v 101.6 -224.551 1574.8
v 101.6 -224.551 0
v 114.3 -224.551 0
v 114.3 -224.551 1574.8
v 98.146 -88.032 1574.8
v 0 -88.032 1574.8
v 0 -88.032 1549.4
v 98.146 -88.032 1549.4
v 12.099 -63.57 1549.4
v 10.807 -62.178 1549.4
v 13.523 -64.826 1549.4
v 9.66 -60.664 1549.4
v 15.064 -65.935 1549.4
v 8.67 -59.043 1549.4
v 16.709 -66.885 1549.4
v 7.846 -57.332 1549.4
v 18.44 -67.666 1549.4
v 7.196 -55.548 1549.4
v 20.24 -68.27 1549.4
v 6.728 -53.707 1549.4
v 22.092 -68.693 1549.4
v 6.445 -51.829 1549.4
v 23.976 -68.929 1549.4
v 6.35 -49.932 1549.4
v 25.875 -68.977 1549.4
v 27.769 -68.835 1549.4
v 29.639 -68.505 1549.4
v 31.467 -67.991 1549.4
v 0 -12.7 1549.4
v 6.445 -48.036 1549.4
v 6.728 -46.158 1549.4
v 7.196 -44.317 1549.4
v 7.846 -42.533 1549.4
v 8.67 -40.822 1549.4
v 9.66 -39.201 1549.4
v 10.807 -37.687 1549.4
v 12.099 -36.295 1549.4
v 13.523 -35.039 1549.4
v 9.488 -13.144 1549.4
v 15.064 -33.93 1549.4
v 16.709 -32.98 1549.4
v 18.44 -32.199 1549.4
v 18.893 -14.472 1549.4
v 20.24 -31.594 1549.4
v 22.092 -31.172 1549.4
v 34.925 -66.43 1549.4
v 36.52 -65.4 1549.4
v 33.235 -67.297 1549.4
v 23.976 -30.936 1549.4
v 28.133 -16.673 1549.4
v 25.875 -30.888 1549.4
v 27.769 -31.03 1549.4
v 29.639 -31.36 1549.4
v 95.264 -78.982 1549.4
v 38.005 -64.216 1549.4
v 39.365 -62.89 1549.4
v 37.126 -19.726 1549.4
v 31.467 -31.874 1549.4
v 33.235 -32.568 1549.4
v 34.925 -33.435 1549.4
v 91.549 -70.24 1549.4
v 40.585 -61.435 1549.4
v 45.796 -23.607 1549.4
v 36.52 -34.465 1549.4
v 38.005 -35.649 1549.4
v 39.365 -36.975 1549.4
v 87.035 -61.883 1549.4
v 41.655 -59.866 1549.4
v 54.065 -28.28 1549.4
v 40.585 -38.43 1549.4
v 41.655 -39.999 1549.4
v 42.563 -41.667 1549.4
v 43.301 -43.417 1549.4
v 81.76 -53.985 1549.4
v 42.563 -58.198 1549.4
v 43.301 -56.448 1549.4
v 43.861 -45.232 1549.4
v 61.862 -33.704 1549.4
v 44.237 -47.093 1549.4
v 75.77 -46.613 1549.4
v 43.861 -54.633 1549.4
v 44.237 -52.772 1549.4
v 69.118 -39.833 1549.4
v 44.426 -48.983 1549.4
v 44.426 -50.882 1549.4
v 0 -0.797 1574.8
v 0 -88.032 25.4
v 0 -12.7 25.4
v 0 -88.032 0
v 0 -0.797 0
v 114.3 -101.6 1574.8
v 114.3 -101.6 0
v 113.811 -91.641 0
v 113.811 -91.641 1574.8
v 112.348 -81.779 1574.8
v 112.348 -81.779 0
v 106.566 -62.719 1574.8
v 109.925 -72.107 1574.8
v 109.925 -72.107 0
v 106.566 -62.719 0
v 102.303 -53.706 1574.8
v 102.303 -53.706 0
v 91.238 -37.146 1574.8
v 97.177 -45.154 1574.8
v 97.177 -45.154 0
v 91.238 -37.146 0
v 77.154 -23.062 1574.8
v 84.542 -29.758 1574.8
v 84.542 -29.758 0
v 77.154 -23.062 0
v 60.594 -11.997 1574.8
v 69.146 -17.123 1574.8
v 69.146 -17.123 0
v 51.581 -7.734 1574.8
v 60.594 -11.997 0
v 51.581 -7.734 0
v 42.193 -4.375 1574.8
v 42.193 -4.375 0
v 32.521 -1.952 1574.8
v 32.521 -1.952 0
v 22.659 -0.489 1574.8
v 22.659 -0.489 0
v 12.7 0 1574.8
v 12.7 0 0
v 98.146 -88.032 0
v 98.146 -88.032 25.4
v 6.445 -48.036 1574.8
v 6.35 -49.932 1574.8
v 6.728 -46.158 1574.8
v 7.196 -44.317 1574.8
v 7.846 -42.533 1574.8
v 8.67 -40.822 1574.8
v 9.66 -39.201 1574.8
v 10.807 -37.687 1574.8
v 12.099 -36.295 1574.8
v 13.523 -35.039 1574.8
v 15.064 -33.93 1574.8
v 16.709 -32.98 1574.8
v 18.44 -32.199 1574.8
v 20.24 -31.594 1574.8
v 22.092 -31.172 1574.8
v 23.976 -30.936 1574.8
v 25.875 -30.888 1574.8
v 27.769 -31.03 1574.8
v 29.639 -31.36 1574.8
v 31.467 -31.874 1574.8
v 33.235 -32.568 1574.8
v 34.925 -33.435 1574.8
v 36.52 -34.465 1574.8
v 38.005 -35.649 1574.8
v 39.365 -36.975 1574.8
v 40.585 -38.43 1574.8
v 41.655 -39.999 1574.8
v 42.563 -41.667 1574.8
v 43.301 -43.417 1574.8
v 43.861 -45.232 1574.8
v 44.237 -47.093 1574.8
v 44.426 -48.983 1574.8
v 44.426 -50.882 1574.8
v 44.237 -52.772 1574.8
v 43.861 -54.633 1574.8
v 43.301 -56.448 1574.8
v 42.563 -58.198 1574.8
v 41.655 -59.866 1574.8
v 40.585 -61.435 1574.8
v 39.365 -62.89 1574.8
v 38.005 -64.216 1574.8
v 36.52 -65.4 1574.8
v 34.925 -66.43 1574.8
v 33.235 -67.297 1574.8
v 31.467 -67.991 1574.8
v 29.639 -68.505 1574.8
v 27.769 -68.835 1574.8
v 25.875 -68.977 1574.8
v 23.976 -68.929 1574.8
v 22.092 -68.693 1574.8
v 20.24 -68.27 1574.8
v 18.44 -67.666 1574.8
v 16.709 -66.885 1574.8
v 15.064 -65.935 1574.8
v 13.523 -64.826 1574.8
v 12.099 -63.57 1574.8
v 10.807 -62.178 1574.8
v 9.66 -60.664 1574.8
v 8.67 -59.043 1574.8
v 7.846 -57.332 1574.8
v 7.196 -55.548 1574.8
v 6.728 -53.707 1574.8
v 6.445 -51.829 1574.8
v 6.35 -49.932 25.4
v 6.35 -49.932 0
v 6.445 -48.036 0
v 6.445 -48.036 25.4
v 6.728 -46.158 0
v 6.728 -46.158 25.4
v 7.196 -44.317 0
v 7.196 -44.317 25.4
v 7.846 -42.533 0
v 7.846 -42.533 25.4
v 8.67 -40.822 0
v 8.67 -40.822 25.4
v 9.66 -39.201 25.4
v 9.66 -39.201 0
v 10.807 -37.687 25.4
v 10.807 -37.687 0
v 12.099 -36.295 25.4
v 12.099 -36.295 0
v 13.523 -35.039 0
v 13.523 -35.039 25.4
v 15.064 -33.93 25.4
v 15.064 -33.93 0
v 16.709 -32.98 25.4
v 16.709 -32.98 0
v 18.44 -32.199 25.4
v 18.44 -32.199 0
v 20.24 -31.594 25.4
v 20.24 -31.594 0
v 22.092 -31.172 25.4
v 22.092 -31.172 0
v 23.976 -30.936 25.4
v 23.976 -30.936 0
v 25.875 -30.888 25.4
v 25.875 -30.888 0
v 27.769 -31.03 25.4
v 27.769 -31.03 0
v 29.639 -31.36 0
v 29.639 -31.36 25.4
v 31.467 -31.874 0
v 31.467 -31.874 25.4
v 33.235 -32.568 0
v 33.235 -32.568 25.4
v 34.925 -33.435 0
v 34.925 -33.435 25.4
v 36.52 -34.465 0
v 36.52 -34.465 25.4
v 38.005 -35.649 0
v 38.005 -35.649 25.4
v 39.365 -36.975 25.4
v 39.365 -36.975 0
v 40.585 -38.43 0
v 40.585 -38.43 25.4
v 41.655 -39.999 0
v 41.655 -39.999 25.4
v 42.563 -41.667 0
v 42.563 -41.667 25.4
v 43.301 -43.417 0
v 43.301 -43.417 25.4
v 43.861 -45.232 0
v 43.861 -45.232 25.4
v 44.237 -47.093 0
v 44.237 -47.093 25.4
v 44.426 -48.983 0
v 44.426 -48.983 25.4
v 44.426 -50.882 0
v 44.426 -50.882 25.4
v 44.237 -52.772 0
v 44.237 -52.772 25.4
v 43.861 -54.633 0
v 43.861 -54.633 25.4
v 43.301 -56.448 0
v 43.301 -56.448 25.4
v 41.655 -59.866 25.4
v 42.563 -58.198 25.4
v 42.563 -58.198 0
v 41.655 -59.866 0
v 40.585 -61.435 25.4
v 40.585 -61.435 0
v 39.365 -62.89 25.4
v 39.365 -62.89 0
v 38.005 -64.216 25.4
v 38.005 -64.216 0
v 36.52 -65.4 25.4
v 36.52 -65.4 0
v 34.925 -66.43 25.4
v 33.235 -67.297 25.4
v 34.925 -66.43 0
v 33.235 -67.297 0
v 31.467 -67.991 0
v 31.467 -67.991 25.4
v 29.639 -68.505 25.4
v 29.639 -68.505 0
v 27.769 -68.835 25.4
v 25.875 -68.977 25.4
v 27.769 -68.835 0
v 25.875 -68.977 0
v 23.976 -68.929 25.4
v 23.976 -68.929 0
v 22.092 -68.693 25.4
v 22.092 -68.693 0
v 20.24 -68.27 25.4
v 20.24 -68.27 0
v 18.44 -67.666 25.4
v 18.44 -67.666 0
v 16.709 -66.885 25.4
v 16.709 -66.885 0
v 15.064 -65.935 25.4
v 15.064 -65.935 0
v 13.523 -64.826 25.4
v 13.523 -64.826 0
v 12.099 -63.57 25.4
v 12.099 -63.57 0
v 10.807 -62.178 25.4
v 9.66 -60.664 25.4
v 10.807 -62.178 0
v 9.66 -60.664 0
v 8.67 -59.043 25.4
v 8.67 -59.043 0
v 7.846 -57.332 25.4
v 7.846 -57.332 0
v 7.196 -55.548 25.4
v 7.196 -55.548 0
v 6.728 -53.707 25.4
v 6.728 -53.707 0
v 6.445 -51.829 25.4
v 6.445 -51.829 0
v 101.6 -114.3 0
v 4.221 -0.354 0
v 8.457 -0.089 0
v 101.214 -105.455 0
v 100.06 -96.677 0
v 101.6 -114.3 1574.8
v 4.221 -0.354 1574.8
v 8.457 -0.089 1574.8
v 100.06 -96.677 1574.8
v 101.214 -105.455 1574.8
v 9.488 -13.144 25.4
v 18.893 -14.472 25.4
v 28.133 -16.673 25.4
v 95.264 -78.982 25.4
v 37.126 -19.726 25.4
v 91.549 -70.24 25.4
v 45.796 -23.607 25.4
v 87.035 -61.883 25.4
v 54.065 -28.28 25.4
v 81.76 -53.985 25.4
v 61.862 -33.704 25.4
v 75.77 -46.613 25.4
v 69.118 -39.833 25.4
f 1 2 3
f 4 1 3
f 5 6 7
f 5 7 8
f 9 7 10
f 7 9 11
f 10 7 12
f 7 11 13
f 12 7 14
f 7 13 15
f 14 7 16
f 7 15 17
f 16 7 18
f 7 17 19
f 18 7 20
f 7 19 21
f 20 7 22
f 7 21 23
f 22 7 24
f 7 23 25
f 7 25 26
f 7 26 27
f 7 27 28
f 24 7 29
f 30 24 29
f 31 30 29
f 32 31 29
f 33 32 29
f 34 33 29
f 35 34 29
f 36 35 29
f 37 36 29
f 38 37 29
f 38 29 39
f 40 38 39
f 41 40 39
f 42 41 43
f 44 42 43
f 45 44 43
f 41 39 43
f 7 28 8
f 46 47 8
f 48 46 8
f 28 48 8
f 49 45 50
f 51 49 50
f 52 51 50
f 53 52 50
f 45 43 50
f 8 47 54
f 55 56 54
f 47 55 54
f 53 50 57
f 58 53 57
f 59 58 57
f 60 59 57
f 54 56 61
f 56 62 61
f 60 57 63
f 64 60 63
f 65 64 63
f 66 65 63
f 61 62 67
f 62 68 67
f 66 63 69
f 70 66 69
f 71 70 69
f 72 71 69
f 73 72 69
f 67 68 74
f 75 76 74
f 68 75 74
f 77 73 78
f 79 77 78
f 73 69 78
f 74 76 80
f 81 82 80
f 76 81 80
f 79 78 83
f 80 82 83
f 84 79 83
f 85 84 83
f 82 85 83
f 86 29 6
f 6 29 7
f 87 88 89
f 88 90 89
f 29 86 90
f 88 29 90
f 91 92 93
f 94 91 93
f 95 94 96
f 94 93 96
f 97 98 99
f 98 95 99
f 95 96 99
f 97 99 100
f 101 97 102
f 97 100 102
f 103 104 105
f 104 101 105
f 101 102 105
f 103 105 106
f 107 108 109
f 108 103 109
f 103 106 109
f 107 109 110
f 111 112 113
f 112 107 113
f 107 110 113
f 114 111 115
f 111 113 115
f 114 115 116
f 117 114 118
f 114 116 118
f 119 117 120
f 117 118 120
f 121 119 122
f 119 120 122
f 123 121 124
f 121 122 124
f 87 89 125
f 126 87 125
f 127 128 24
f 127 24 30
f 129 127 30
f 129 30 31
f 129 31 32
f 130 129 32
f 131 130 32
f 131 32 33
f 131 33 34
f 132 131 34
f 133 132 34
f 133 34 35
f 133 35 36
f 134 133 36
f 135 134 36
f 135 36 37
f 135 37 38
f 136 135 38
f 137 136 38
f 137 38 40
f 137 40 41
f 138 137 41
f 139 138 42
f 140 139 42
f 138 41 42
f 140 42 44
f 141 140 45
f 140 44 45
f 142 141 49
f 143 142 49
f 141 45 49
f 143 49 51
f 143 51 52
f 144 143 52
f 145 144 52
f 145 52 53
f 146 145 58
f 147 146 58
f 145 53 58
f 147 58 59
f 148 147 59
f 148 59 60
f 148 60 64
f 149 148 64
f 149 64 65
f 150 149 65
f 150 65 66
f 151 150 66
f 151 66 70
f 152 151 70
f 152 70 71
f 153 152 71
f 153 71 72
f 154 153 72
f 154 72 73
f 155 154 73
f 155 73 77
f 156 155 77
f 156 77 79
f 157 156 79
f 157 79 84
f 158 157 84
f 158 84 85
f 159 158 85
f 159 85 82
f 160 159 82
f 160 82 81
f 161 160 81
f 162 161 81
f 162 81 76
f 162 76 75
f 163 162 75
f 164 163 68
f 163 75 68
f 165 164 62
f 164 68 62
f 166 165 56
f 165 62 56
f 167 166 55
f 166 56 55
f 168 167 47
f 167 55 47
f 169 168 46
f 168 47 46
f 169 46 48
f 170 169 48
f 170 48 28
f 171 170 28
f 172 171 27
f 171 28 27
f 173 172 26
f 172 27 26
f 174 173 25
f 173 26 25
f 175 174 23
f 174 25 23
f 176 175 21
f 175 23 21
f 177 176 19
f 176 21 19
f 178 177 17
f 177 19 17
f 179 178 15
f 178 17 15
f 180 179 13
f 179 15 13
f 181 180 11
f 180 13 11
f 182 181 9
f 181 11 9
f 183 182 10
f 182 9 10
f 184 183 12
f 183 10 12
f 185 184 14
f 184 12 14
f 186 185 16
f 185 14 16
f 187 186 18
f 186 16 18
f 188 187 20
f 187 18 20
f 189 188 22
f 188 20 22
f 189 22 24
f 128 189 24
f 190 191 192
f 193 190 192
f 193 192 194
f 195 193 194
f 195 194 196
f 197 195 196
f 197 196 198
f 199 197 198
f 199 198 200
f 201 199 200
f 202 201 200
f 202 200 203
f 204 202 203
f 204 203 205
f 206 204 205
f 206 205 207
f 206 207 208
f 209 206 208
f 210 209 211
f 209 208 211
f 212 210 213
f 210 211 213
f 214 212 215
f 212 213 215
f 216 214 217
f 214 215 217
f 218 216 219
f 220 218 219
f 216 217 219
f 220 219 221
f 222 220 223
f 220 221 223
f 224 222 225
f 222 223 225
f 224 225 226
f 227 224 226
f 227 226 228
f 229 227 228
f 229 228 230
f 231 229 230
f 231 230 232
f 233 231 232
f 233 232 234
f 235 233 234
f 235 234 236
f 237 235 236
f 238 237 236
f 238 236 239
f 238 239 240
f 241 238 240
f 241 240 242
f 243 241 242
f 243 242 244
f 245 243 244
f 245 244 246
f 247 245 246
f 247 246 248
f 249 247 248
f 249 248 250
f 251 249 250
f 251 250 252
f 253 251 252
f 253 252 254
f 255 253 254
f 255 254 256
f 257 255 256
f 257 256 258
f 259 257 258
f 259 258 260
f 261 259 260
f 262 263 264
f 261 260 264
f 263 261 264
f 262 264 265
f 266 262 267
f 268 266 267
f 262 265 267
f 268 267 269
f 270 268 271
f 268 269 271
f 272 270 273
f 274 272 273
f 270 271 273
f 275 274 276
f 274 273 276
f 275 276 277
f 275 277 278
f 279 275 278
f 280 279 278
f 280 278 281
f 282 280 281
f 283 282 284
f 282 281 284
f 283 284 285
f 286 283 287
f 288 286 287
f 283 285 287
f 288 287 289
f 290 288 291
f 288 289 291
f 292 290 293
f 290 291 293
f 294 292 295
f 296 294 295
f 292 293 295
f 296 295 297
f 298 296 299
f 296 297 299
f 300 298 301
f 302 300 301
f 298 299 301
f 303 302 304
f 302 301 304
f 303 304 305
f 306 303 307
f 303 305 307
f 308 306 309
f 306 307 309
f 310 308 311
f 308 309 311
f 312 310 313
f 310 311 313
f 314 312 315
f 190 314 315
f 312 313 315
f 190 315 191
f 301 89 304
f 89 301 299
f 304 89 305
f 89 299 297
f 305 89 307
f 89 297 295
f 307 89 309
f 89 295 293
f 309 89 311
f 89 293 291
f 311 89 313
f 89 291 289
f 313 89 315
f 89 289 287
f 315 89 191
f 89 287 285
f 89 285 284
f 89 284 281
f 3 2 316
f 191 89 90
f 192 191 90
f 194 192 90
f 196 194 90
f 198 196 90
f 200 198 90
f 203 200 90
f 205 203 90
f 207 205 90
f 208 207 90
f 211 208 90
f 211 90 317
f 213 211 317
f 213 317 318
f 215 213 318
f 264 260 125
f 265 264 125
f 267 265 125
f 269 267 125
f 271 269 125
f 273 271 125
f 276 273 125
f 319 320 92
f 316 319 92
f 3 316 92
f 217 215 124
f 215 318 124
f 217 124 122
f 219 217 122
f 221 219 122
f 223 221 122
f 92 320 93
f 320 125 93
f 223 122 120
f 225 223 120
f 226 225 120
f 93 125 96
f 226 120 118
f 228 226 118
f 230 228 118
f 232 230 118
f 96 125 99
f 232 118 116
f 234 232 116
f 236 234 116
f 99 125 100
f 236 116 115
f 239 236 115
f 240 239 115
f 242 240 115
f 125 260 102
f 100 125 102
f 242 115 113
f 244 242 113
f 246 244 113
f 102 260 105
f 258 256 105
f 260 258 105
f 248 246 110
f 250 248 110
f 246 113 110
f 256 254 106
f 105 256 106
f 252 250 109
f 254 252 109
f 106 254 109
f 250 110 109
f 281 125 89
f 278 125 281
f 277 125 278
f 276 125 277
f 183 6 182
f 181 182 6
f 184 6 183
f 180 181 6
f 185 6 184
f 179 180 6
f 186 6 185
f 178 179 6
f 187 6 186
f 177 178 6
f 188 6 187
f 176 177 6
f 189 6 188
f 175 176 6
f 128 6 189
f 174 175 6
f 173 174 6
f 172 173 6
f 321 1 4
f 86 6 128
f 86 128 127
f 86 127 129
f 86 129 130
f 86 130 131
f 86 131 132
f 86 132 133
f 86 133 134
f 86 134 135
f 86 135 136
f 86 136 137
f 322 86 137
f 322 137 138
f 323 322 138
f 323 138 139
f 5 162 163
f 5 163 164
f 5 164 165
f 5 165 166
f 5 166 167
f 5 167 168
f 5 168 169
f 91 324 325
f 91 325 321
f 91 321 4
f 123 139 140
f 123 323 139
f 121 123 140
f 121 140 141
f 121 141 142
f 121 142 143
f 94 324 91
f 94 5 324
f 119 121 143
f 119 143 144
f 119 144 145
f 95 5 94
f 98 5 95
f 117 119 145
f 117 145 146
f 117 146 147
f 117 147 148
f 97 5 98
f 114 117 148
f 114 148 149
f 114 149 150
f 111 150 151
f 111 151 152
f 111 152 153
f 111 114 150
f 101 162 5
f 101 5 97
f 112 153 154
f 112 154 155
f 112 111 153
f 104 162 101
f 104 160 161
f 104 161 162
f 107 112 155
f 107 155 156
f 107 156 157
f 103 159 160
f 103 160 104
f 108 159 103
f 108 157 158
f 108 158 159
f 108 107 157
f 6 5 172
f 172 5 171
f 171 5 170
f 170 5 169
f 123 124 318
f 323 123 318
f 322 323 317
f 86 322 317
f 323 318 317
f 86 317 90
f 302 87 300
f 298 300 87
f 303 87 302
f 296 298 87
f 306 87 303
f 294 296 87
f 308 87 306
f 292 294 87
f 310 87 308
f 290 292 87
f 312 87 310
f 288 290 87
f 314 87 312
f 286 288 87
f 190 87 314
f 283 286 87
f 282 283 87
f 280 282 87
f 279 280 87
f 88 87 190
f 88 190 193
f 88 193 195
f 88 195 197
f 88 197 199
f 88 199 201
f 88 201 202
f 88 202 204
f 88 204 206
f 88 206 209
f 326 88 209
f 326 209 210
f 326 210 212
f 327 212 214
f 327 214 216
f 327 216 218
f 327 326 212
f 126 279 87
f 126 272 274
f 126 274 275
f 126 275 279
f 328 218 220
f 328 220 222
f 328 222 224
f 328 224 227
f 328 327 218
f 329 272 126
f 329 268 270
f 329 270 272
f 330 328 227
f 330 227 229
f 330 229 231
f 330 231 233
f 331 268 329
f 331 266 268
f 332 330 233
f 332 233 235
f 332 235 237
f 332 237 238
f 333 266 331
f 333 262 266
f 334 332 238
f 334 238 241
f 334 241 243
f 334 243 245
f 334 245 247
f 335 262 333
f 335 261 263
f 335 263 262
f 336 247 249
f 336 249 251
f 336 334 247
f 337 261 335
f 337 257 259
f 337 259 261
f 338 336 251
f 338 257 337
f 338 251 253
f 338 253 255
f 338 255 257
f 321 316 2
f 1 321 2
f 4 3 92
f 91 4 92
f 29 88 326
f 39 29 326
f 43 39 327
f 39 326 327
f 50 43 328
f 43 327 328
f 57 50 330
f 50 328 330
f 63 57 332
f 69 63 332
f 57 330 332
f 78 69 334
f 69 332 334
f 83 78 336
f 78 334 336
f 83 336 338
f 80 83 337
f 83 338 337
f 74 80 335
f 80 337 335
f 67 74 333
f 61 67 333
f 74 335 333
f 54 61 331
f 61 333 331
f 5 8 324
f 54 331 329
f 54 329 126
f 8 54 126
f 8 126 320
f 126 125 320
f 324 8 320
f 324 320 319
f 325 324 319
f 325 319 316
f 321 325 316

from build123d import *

# Parameters (mm, degrees)
BOSS_EXTRUDE1_DEPTH = 1574.8
BOSS_EXTRUDE2_DEPTH = 25.4
SKETCH3_R           = 19.05
CUT_EXTRUDE1_DEPTH  = 1575.8


with BuildPart() as part:
    # Sketch1 → Boss-Extrude1 (new body)
    with BuildSketch(Plane.XY):
        with BuildLine():
            ThreePointArc((114.3, -101.6), (84.542048969, -29.757951031), (12.7, 0))
            ThreePointArc((12.7, 0), (6.337512086, -0.199414462), (0, -0.796875048))
            Line((0, -0.796875048), (0, -12.7))
            ThreePointArc((0, -12.7), (71.842048969, -42.457951031), (101.6, -114.3))
            Line((101.6, -114.3), (101.6, -224.550826558))
            Line((101.6, -224.550826558), (114.3, -224.550826558))
            Line((114.3, -224.550826558), (114.3, -101.6))
        make_face()
    extrude(amount=BOSS_EXTRUDE1_DEPTH)

    # Sketch2 → Boss-Extrude2 (add)
    with BuildSketch(Plane(origin=(0, 0, 0), x_dir=(-1, 0, 0), z_dir=(0, 0, -1))):
        with BuildLine():
            Line((0, -0.796875048), (0, -88.032487207))
            Line((0, -88.032487207), (-113.39003226, -88.032487207))
            ThreePointArc((-113.39003226, -88.032487207), (-74.652194888, -21.073696542), (0, -0.796875048))
        make_face()
    boss_extrude2 = extrude(amount=-BOSS_EXTRUDE2_DEPTH)

    # Mirror2: Boss-Extrude2 across plane
    add(boss_extrude2.mirror(Plane(origin=(0, 0, 787.4), x_dir=(1, 0, 0), z_dir=(0, 0, -1))))

    # Sketch3 → Cut-Extrude1 (cut, through all)
    with BuildSketch(Plane(origin=(0, 0, 0), x_dir=(-1, 0, 0), z_dir=(0, 0, -1))):
        with Locations((-25.4, -49.932487207)):
            Circle(SKETCH3_R)
    extrude(amount=-CUT_EXTRUDE1_DEPTH, mode=Mode.SUBTRACT)


solid = part.part
